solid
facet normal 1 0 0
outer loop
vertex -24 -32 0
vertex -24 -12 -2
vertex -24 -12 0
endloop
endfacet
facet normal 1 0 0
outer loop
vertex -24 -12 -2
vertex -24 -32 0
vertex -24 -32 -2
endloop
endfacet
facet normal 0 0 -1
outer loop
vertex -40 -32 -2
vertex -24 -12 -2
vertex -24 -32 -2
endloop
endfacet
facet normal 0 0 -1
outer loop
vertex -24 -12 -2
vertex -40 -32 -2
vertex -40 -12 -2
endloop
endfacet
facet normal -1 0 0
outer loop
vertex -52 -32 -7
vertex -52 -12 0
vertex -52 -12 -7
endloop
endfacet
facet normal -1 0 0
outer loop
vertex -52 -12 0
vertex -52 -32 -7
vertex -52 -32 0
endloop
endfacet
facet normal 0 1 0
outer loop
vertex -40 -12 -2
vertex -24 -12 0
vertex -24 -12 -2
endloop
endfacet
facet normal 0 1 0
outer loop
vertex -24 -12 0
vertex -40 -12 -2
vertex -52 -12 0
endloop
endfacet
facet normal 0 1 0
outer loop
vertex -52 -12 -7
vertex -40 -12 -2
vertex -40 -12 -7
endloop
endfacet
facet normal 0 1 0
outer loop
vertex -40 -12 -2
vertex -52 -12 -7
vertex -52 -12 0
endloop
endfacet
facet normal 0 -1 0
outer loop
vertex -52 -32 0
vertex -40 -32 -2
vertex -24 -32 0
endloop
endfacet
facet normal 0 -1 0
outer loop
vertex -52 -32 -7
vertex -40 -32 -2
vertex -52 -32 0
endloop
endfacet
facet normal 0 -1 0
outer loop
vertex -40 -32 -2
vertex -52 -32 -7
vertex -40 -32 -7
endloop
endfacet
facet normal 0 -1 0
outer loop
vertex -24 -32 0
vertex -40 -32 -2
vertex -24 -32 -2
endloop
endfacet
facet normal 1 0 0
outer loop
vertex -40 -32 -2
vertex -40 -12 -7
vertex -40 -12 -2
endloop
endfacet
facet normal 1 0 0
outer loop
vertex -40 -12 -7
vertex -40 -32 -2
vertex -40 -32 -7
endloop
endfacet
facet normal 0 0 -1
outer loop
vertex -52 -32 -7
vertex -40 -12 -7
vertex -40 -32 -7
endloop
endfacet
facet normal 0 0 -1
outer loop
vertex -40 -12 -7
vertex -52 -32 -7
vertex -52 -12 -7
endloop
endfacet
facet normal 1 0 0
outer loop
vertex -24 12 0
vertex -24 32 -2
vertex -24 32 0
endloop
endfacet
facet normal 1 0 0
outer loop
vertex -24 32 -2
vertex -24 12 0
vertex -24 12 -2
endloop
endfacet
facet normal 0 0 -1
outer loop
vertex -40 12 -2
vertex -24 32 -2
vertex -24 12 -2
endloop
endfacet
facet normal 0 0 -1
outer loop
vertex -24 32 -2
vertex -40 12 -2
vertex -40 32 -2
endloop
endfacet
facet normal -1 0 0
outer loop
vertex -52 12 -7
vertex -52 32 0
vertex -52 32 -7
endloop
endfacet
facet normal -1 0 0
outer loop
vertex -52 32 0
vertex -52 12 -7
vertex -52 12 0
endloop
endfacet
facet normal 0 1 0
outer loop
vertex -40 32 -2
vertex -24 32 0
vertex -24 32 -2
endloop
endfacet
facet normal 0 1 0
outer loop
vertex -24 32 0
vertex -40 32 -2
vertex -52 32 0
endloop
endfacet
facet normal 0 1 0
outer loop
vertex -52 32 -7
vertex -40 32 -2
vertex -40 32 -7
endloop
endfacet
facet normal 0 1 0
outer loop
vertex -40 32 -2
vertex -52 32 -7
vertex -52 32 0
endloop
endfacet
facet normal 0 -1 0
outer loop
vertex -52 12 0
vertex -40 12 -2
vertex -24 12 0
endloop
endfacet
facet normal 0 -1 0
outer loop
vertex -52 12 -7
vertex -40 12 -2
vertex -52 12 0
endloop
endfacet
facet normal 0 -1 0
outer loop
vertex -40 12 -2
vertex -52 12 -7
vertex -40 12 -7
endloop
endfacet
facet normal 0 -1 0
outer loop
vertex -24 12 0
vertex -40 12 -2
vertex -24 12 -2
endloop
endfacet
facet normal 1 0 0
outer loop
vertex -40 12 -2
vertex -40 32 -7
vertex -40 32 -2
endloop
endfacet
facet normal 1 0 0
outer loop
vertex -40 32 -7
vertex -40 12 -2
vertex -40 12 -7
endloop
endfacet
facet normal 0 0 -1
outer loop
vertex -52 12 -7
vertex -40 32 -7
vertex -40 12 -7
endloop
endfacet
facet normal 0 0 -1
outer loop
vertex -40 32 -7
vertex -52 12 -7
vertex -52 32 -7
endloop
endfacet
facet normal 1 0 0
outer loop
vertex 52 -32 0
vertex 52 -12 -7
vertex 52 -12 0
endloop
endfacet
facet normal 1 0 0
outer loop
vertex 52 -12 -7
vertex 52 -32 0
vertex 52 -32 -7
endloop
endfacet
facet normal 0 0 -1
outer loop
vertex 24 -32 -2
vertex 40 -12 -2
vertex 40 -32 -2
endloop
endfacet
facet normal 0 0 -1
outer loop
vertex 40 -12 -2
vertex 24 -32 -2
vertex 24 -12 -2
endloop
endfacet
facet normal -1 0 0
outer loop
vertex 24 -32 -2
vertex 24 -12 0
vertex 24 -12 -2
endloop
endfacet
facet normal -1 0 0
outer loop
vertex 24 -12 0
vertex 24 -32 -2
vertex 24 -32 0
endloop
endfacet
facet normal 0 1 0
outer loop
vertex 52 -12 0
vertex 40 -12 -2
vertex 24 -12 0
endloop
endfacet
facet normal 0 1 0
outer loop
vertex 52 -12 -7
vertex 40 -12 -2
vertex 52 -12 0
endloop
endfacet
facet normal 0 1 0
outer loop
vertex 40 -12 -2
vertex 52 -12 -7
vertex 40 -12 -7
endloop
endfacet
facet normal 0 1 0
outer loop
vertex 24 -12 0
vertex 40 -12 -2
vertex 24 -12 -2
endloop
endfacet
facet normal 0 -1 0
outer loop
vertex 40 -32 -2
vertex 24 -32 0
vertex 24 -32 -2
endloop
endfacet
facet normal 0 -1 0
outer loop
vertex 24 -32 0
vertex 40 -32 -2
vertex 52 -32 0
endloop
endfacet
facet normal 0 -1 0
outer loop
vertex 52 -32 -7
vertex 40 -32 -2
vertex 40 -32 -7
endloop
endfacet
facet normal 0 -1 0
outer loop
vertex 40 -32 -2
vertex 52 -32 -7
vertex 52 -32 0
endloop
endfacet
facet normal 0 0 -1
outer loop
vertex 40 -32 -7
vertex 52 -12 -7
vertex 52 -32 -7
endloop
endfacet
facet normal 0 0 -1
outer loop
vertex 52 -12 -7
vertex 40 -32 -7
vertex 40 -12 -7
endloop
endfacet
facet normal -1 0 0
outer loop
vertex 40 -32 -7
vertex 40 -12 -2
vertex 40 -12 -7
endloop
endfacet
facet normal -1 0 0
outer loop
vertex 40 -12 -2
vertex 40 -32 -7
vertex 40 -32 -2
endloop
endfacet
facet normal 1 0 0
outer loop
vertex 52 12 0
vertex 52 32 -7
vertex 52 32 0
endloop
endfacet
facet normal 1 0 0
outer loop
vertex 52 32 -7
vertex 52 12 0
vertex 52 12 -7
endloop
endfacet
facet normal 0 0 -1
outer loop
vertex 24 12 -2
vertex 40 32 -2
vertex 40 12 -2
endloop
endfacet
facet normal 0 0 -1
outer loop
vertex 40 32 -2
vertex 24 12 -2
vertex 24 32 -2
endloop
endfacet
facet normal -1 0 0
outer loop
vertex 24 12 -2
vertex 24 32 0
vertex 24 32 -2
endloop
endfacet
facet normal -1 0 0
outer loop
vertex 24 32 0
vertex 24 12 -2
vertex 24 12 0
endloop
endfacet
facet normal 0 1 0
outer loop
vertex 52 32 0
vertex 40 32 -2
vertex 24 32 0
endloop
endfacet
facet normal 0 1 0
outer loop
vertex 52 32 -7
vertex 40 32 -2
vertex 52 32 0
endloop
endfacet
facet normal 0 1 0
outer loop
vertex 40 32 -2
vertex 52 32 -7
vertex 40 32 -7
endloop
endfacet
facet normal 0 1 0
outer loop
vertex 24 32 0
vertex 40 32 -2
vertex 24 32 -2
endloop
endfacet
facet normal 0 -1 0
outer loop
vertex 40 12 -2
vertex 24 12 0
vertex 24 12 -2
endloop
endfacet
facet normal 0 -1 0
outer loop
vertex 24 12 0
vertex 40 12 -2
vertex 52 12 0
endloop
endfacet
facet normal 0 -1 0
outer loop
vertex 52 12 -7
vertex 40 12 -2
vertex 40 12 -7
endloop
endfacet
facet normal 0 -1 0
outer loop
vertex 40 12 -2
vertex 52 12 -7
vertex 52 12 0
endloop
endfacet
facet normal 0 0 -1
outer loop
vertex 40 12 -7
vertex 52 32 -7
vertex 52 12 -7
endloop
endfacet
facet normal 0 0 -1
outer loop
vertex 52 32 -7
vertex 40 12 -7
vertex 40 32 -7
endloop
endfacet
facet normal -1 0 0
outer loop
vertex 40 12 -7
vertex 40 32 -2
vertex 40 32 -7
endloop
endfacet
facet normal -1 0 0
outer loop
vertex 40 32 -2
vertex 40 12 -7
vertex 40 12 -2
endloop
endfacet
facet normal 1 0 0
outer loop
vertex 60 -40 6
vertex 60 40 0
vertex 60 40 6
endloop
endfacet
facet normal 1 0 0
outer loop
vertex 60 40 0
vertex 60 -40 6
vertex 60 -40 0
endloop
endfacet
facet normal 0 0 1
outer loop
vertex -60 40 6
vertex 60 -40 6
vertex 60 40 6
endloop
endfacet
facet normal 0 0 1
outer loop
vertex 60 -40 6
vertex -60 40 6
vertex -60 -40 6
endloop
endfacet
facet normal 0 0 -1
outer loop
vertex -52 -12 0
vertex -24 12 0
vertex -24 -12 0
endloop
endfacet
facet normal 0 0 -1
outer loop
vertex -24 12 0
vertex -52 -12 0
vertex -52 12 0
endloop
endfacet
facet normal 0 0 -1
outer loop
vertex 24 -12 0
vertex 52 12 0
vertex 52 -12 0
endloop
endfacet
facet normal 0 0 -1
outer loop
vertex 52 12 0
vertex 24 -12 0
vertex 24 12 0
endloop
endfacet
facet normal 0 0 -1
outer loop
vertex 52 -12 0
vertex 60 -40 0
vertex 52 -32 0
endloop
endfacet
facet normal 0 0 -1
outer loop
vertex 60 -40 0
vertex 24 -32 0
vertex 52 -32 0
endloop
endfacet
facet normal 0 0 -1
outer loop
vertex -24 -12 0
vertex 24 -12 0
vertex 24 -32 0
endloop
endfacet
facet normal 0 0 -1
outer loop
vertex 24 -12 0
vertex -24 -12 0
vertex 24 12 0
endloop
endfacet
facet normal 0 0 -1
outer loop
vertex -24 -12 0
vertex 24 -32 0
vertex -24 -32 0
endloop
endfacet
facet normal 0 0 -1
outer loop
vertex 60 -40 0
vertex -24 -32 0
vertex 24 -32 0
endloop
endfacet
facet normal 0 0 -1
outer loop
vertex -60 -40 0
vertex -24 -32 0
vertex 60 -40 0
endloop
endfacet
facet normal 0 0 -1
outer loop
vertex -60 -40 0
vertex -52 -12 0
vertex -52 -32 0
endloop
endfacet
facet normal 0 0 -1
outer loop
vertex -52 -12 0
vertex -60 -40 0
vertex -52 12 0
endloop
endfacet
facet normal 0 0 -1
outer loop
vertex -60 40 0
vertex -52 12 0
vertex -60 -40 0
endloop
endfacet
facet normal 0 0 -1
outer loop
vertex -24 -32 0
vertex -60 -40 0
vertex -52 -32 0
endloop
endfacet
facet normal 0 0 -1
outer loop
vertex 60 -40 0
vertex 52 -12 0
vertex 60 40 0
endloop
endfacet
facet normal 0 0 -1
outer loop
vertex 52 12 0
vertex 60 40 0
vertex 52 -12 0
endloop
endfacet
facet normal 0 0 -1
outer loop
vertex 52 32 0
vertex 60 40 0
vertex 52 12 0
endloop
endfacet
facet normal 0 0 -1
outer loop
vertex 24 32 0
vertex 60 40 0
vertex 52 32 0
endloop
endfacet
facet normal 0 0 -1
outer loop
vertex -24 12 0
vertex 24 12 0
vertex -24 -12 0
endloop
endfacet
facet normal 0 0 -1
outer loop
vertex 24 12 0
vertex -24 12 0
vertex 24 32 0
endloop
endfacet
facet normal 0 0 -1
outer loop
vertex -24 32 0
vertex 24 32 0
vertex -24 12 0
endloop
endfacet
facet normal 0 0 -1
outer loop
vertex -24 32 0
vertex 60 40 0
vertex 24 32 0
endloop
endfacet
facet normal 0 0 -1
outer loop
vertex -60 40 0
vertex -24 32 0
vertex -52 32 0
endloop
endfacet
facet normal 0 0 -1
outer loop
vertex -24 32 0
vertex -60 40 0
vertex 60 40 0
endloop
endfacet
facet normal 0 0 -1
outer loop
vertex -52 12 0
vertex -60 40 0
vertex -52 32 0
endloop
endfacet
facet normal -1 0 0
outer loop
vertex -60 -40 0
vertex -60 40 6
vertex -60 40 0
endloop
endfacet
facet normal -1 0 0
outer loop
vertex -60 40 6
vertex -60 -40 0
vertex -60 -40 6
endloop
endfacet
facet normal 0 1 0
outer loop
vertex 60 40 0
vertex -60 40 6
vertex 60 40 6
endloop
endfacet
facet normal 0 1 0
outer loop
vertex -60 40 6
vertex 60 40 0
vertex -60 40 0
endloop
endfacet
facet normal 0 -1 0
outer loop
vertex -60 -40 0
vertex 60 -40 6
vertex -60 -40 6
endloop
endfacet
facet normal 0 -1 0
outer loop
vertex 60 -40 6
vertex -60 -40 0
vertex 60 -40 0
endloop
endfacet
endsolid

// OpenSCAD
// Parameters (mm)
slab_x = 120;          // Left-right slab size
slab_y = 80;           // Front-back slab size
slab_z = 6;            // Slab thickness

pad_x = 28;            // Shallow pad left-right size
pad_y = 20;            // Shallow pad front-back size
pad_z = 2;             // Shallow pad underside depth

continuation_x = 12;   // Narrower lower continuation left-right size
continuation_z = 5;    // Lower continuation depth below pad

pad_margin_x = 8;      // Pad inset from left/right slab edges
pad_margin_y = 8;      // Pad inset from front/back slab edges

overlap = 0.02;        // Small overlap for robust unions

// Derived pad center offsets
pad_center_x = slab_x/2 - pad_margin_x - pad_x/2;
pad_center_y = slab_y/2 - pad_margin_y - pad_y/2;

// Helper: centered rectangular solid
module rectangular_solid(size_vec, center_pos) {
    translate(center_pos)
        cube(size_vec, center=true);
}

// Main rectangular slab, bottom face at z=0
module main_slab() {
    rectangular_solid(
        [slab_x, slab_y, slab_z],
        [0, 0, slab_z/2]
    );
}

// Shallow underside pad, slightly overlapping slab underside
module shallow_pad(cx, cy) {
    rectangular_solid(
        [pad_x, pad_y, pad_z + overlap],
        [cx, cy, -pad_z/2 + overlap/2]
    );
}

// Narrower deeper continuation, sharing one side edge and full front/back edges
module lower_continuation(cx, cy, edge_side) {
    cont_cx = cx + edge_side * (pad_x - continuation_x) / 2;

    rectangular_solid(
        [continuation_x, pad_y, continuation_z + overlap],
        [cont_cx, cy, -pad_z - continuation_z/2 + overlap/2]
    );
}

// One complete two-tier underside protrusion
module tiered_underside_pad(cx, cy, edge_side) {
    union() {
        shallow_pad(cx, cy);
        lower_continuation(cx, cy, edge_side);
    }
}

// Four pads near the slab perimeter
module underside_features() {
    for (x_side = [-1, 1]) {
        for (y_side = [-1, 1]) {
            tiered_underside_pad(
                x_side * pad_center_x,
                y_side * pad_center_y,
                x_side
            );
        }
    }
}

// Final model
union() {
    main_slab();
    underside_features();
}
